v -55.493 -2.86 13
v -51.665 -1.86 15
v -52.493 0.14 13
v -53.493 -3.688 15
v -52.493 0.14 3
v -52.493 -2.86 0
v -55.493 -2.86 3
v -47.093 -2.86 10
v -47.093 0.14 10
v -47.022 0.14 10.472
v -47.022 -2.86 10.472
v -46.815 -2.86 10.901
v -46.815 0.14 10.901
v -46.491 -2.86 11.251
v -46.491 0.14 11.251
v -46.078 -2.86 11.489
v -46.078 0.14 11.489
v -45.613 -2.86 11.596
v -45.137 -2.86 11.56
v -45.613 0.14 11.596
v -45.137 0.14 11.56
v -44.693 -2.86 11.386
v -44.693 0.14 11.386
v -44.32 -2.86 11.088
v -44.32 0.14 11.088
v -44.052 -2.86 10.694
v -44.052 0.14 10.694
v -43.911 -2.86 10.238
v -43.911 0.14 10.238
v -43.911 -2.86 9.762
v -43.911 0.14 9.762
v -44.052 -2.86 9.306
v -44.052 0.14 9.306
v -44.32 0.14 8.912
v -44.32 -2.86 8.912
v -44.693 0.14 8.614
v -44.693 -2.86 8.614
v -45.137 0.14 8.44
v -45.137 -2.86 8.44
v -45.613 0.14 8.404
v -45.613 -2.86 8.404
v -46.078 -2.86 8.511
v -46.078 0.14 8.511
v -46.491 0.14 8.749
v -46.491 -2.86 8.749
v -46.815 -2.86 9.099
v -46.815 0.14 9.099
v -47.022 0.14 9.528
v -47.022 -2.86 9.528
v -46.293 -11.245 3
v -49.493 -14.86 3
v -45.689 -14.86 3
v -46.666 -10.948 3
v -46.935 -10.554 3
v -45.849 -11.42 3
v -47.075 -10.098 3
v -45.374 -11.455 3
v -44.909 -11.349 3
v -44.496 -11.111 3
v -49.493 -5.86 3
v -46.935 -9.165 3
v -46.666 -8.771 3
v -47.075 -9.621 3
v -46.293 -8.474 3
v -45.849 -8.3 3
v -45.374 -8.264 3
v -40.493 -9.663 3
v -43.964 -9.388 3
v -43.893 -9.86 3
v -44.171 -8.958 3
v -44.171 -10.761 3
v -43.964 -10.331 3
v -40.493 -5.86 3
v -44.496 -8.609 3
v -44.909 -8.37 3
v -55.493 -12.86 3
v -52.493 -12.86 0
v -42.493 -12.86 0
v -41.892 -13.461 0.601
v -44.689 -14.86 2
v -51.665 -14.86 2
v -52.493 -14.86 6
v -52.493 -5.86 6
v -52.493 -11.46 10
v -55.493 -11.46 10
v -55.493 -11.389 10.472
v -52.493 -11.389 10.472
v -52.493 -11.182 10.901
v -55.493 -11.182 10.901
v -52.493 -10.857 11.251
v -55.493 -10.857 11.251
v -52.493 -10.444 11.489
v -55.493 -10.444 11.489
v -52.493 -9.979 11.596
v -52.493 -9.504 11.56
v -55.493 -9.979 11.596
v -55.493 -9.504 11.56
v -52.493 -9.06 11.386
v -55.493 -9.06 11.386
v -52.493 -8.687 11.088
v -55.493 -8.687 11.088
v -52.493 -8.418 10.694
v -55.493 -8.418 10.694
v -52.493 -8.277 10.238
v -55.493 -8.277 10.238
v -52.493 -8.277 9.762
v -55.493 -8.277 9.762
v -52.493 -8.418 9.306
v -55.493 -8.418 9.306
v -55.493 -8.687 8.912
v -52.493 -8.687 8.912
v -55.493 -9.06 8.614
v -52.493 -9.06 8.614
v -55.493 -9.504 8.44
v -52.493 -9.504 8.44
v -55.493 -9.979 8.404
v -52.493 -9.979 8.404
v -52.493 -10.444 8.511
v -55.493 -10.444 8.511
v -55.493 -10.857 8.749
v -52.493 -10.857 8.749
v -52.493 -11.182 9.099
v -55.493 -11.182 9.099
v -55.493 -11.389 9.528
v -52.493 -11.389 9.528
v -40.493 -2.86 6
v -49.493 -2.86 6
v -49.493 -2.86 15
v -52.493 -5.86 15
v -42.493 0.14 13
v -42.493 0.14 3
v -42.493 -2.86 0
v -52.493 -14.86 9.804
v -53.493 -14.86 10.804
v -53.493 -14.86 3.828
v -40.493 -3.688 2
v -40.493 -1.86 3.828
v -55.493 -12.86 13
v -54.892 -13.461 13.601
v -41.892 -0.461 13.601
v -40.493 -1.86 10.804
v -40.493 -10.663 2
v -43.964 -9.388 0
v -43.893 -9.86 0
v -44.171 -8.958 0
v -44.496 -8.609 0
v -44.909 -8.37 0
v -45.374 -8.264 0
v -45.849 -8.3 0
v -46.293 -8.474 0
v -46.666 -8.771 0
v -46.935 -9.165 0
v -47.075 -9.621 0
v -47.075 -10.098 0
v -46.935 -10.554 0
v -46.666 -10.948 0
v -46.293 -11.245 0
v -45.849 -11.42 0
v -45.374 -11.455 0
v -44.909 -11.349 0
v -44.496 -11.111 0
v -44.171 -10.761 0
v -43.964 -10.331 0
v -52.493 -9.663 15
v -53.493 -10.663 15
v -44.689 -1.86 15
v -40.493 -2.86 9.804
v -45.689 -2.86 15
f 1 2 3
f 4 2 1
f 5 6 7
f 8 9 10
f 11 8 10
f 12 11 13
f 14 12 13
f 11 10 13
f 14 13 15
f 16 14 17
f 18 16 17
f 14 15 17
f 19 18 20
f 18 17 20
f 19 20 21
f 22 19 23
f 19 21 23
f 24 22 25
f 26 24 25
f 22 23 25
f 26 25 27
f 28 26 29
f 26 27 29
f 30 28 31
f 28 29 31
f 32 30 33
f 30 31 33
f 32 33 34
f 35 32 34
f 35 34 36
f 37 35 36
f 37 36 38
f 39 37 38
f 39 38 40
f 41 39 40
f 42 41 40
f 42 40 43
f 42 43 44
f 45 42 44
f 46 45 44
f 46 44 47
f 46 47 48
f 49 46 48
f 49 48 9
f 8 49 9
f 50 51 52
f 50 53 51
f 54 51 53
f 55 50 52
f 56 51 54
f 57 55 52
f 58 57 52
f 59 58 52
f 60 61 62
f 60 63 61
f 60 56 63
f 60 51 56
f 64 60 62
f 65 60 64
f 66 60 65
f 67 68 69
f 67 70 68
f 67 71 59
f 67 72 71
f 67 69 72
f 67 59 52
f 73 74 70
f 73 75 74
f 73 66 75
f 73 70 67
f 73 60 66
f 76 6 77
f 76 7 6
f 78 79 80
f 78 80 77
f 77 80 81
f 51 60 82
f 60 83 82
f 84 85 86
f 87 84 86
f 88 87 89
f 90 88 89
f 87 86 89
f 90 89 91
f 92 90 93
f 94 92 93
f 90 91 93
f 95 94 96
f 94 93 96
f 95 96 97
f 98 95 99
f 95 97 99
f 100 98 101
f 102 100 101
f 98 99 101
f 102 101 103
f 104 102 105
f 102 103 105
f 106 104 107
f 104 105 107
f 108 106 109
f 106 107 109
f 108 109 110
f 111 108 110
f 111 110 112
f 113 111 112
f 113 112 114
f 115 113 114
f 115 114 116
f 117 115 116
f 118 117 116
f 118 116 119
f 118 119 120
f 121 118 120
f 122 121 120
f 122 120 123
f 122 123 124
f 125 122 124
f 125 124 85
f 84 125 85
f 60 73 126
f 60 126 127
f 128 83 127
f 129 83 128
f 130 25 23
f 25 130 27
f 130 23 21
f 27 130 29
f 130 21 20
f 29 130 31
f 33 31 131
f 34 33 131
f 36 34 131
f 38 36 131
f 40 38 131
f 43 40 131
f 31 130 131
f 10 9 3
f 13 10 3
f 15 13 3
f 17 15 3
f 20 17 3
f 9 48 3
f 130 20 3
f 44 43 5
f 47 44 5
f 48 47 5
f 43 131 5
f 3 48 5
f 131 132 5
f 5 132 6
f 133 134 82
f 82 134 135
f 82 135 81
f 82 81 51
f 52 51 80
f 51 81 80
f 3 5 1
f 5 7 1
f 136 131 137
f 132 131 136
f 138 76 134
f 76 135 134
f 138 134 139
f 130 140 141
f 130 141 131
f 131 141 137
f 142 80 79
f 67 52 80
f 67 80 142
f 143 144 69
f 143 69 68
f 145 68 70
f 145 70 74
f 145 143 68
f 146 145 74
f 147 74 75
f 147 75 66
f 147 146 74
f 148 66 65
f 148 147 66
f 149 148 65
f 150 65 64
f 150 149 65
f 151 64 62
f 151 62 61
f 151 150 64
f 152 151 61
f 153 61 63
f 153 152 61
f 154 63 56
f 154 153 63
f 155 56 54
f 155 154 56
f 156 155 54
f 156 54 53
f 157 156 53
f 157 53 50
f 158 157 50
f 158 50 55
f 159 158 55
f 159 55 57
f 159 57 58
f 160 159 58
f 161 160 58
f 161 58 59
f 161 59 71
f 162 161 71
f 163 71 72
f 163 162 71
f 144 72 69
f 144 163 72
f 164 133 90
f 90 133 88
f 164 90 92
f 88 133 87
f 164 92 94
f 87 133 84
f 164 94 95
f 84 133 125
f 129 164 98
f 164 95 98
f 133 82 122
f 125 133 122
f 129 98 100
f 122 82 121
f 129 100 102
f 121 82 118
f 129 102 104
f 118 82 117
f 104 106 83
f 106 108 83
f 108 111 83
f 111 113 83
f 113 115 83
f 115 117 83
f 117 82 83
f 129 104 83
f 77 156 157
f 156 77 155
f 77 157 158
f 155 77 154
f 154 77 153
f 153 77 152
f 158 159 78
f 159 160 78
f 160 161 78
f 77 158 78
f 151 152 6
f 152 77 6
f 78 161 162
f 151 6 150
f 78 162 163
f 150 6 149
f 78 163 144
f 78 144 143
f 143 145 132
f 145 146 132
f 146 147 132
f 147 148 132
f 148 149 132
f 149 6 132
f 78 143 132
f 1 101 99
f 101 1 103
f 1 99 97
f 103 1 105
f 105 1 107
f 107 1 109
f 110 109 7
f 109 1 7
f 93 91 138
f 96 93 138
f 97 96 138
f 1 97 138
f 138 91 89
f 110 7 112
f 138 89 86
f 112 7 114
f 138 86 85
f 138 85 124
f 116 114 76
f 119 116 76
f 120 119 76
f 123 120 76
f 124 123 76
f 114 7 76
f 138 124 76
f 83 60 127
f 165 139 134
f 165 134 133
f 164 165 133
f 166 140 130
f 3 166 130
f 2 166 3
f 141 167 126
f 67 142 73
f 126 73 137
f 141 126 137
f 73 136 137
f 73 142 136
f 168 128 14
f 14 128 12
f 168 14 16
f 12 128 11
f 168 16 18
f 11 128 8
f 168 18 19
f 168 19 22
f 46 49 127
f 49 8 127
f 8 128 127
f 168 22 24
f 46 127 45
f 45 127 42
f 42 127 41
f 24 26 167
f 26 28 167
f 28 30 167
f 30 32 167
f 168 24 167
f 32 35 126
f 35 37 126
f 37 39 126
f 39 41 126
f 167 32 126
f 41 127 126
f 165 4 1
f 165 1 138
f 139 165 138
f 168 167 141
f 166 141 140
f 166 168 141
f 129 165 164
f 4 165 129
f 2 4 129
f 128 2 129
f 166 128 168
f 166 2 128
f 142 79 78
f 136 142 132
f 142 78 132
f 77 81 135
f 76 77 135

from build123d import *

# Parameters (mm, degrees)
F0_W     = 12
F0_H     = 12
F0_R     = 1.6
F1_DEPTH = 3
F2_DEPTH = 15
F3_R     = 1.6
F4_DEPTH = 25
F5_R     = 1.6
F6_DEPTH = 25
F9_DEPTH = 3
F10_SIZE = 3
F11_SIZE = 2


with BuildPart() as f1:
    # F0 (on Top) → F1 (new body)
    with BuildSketch(Plane.XY):
        Polygon((-40.4932990621, 0.140377609), (-55.4932990621, 0.140377609), (-55.4932990621, -14.859622391), (-52.4932990621, -14.859622391), (-52.4932990621, -2.859622391), (-40.4932990621, -2.859622391), align=None)
        with Locations((-46.4932990621, -8.859622391)):
            Rectangle(F0_W, F0_H)
        with Locations((-45.4932990621, -9.859622391)):
            Circle(F0_R, mode=Mode.SUBTRACT)
    extrude(amount=F1_DEPTH)

    # F0 (on Top) → F2 (join)
    with BuildSketch(Plane.XY):
        Polygon((-40.4932990621, 0.140377609), (-55.4932990621, 0.140377609), (-55.4932990621, -14.859622391), (-52.4932990621, -14.859622391), (-52.4932990621, -2.859622391), (-40.4932990621, -2.859622391), align=None)
    extrude(amount=F2_DEPTH)

    # F3 (on face) → F4 (cut)
    with BuildSketch(Plane(origin=(0, 0.140377609, 0), x_dir=(-1, 0, 0), z_dir=(0, 1, 0))):
        with Locations((45.4932990621, 10)):
            Circle(F3_R)
    extrude(amount=-F4_DEPTH, mode=Mode.SUBTRACT)

    # F5 (on face) → F6 (cut)
    with BuildSketch(Plane(origin=(-55.4932990621, 0, 0), x_dir=(0, -1, 0), z_dir=(-1, 0, 0))):
        with Locations((9.859622391, 10)):
            Circle(F5_R)
    extrude(amount=-F6_DEPTH, mode=Mode.SUBTRACT)

    # F8 (on 3pt) → F9 (cut)
    with BuildSketch(Plane(origin=(-7.5445588904, 7.5445588904, -7.5445588904), x_dir=(0.4082482905, 0.8164965809, 0.4082482905), z_dir=(0.5773502692, -0.5773502692, 0.5773502692))):
        Polygon((-13.727562502, 49.4428761303), (-30.1936492324, 50.4539981484), (-37.5646241009, 38.8832576573), (-31.7441225052, 25.3719072789), (-16.306232661, 24.6546380222), (-6.8639284, 39.3281951547), align=None)
    extrude(amount=-F9_DEPTH, mode=Mode.SUBTRACT)

    # F10
    f10_edges = [f1.edges().sort_by_distance(p)[0] for p in [
        (-55.493299, -7.359622, 0),
        (-47.993299, 0.140378, 0),
        (-55.493299, 0.140378, 7.5),
        (-52.493299, -8.859622, 3),
        (-46.493299, -2.859622, 3),
        (-52.493299, -2.859622, 9),
    ]]
    chamfer(f10_edges, length=F10_SIZE)

    # F11 (call 1 of 3: OpenCascade refuses the feature's edges together)
    f11_edges = [f1.edges().sort_by_distance(p)[0] for p in [
        (-40.493299, 0.140378, 7.901924),
        (-40.493299, -7.761546, 0),
        (-40.493299, -1.359622, 1.5),
    ]]
    chamfer(f11_edges, length=F11_SIZE)

    # F11#2 (call 2 of 3)
    f11_2_edges = [f1.edges().sort_by_distance(p)[0] for p in [
        (-47.591375, -14.859622, 0),
        (-55.493299, -14.859622, 7.901924),
        (-53.993299, -14.859622, 1.5),
    ]]
    chamfer(f11_2_edges, length=F11_SIZE)

    # F11#3 (call 3 of 3)
    f11_3_edges = [f1.edges().sort_by_distance(p)[0] for p in [
        (-53.993299, -1.359622, 15),
        (-55.493299, -7.761546, 15),
        (-47.591375, 0.140378, 15),
    ]]
    chamfer(f11_3_edges, length=F11_SIZE)


solid = f1.part
